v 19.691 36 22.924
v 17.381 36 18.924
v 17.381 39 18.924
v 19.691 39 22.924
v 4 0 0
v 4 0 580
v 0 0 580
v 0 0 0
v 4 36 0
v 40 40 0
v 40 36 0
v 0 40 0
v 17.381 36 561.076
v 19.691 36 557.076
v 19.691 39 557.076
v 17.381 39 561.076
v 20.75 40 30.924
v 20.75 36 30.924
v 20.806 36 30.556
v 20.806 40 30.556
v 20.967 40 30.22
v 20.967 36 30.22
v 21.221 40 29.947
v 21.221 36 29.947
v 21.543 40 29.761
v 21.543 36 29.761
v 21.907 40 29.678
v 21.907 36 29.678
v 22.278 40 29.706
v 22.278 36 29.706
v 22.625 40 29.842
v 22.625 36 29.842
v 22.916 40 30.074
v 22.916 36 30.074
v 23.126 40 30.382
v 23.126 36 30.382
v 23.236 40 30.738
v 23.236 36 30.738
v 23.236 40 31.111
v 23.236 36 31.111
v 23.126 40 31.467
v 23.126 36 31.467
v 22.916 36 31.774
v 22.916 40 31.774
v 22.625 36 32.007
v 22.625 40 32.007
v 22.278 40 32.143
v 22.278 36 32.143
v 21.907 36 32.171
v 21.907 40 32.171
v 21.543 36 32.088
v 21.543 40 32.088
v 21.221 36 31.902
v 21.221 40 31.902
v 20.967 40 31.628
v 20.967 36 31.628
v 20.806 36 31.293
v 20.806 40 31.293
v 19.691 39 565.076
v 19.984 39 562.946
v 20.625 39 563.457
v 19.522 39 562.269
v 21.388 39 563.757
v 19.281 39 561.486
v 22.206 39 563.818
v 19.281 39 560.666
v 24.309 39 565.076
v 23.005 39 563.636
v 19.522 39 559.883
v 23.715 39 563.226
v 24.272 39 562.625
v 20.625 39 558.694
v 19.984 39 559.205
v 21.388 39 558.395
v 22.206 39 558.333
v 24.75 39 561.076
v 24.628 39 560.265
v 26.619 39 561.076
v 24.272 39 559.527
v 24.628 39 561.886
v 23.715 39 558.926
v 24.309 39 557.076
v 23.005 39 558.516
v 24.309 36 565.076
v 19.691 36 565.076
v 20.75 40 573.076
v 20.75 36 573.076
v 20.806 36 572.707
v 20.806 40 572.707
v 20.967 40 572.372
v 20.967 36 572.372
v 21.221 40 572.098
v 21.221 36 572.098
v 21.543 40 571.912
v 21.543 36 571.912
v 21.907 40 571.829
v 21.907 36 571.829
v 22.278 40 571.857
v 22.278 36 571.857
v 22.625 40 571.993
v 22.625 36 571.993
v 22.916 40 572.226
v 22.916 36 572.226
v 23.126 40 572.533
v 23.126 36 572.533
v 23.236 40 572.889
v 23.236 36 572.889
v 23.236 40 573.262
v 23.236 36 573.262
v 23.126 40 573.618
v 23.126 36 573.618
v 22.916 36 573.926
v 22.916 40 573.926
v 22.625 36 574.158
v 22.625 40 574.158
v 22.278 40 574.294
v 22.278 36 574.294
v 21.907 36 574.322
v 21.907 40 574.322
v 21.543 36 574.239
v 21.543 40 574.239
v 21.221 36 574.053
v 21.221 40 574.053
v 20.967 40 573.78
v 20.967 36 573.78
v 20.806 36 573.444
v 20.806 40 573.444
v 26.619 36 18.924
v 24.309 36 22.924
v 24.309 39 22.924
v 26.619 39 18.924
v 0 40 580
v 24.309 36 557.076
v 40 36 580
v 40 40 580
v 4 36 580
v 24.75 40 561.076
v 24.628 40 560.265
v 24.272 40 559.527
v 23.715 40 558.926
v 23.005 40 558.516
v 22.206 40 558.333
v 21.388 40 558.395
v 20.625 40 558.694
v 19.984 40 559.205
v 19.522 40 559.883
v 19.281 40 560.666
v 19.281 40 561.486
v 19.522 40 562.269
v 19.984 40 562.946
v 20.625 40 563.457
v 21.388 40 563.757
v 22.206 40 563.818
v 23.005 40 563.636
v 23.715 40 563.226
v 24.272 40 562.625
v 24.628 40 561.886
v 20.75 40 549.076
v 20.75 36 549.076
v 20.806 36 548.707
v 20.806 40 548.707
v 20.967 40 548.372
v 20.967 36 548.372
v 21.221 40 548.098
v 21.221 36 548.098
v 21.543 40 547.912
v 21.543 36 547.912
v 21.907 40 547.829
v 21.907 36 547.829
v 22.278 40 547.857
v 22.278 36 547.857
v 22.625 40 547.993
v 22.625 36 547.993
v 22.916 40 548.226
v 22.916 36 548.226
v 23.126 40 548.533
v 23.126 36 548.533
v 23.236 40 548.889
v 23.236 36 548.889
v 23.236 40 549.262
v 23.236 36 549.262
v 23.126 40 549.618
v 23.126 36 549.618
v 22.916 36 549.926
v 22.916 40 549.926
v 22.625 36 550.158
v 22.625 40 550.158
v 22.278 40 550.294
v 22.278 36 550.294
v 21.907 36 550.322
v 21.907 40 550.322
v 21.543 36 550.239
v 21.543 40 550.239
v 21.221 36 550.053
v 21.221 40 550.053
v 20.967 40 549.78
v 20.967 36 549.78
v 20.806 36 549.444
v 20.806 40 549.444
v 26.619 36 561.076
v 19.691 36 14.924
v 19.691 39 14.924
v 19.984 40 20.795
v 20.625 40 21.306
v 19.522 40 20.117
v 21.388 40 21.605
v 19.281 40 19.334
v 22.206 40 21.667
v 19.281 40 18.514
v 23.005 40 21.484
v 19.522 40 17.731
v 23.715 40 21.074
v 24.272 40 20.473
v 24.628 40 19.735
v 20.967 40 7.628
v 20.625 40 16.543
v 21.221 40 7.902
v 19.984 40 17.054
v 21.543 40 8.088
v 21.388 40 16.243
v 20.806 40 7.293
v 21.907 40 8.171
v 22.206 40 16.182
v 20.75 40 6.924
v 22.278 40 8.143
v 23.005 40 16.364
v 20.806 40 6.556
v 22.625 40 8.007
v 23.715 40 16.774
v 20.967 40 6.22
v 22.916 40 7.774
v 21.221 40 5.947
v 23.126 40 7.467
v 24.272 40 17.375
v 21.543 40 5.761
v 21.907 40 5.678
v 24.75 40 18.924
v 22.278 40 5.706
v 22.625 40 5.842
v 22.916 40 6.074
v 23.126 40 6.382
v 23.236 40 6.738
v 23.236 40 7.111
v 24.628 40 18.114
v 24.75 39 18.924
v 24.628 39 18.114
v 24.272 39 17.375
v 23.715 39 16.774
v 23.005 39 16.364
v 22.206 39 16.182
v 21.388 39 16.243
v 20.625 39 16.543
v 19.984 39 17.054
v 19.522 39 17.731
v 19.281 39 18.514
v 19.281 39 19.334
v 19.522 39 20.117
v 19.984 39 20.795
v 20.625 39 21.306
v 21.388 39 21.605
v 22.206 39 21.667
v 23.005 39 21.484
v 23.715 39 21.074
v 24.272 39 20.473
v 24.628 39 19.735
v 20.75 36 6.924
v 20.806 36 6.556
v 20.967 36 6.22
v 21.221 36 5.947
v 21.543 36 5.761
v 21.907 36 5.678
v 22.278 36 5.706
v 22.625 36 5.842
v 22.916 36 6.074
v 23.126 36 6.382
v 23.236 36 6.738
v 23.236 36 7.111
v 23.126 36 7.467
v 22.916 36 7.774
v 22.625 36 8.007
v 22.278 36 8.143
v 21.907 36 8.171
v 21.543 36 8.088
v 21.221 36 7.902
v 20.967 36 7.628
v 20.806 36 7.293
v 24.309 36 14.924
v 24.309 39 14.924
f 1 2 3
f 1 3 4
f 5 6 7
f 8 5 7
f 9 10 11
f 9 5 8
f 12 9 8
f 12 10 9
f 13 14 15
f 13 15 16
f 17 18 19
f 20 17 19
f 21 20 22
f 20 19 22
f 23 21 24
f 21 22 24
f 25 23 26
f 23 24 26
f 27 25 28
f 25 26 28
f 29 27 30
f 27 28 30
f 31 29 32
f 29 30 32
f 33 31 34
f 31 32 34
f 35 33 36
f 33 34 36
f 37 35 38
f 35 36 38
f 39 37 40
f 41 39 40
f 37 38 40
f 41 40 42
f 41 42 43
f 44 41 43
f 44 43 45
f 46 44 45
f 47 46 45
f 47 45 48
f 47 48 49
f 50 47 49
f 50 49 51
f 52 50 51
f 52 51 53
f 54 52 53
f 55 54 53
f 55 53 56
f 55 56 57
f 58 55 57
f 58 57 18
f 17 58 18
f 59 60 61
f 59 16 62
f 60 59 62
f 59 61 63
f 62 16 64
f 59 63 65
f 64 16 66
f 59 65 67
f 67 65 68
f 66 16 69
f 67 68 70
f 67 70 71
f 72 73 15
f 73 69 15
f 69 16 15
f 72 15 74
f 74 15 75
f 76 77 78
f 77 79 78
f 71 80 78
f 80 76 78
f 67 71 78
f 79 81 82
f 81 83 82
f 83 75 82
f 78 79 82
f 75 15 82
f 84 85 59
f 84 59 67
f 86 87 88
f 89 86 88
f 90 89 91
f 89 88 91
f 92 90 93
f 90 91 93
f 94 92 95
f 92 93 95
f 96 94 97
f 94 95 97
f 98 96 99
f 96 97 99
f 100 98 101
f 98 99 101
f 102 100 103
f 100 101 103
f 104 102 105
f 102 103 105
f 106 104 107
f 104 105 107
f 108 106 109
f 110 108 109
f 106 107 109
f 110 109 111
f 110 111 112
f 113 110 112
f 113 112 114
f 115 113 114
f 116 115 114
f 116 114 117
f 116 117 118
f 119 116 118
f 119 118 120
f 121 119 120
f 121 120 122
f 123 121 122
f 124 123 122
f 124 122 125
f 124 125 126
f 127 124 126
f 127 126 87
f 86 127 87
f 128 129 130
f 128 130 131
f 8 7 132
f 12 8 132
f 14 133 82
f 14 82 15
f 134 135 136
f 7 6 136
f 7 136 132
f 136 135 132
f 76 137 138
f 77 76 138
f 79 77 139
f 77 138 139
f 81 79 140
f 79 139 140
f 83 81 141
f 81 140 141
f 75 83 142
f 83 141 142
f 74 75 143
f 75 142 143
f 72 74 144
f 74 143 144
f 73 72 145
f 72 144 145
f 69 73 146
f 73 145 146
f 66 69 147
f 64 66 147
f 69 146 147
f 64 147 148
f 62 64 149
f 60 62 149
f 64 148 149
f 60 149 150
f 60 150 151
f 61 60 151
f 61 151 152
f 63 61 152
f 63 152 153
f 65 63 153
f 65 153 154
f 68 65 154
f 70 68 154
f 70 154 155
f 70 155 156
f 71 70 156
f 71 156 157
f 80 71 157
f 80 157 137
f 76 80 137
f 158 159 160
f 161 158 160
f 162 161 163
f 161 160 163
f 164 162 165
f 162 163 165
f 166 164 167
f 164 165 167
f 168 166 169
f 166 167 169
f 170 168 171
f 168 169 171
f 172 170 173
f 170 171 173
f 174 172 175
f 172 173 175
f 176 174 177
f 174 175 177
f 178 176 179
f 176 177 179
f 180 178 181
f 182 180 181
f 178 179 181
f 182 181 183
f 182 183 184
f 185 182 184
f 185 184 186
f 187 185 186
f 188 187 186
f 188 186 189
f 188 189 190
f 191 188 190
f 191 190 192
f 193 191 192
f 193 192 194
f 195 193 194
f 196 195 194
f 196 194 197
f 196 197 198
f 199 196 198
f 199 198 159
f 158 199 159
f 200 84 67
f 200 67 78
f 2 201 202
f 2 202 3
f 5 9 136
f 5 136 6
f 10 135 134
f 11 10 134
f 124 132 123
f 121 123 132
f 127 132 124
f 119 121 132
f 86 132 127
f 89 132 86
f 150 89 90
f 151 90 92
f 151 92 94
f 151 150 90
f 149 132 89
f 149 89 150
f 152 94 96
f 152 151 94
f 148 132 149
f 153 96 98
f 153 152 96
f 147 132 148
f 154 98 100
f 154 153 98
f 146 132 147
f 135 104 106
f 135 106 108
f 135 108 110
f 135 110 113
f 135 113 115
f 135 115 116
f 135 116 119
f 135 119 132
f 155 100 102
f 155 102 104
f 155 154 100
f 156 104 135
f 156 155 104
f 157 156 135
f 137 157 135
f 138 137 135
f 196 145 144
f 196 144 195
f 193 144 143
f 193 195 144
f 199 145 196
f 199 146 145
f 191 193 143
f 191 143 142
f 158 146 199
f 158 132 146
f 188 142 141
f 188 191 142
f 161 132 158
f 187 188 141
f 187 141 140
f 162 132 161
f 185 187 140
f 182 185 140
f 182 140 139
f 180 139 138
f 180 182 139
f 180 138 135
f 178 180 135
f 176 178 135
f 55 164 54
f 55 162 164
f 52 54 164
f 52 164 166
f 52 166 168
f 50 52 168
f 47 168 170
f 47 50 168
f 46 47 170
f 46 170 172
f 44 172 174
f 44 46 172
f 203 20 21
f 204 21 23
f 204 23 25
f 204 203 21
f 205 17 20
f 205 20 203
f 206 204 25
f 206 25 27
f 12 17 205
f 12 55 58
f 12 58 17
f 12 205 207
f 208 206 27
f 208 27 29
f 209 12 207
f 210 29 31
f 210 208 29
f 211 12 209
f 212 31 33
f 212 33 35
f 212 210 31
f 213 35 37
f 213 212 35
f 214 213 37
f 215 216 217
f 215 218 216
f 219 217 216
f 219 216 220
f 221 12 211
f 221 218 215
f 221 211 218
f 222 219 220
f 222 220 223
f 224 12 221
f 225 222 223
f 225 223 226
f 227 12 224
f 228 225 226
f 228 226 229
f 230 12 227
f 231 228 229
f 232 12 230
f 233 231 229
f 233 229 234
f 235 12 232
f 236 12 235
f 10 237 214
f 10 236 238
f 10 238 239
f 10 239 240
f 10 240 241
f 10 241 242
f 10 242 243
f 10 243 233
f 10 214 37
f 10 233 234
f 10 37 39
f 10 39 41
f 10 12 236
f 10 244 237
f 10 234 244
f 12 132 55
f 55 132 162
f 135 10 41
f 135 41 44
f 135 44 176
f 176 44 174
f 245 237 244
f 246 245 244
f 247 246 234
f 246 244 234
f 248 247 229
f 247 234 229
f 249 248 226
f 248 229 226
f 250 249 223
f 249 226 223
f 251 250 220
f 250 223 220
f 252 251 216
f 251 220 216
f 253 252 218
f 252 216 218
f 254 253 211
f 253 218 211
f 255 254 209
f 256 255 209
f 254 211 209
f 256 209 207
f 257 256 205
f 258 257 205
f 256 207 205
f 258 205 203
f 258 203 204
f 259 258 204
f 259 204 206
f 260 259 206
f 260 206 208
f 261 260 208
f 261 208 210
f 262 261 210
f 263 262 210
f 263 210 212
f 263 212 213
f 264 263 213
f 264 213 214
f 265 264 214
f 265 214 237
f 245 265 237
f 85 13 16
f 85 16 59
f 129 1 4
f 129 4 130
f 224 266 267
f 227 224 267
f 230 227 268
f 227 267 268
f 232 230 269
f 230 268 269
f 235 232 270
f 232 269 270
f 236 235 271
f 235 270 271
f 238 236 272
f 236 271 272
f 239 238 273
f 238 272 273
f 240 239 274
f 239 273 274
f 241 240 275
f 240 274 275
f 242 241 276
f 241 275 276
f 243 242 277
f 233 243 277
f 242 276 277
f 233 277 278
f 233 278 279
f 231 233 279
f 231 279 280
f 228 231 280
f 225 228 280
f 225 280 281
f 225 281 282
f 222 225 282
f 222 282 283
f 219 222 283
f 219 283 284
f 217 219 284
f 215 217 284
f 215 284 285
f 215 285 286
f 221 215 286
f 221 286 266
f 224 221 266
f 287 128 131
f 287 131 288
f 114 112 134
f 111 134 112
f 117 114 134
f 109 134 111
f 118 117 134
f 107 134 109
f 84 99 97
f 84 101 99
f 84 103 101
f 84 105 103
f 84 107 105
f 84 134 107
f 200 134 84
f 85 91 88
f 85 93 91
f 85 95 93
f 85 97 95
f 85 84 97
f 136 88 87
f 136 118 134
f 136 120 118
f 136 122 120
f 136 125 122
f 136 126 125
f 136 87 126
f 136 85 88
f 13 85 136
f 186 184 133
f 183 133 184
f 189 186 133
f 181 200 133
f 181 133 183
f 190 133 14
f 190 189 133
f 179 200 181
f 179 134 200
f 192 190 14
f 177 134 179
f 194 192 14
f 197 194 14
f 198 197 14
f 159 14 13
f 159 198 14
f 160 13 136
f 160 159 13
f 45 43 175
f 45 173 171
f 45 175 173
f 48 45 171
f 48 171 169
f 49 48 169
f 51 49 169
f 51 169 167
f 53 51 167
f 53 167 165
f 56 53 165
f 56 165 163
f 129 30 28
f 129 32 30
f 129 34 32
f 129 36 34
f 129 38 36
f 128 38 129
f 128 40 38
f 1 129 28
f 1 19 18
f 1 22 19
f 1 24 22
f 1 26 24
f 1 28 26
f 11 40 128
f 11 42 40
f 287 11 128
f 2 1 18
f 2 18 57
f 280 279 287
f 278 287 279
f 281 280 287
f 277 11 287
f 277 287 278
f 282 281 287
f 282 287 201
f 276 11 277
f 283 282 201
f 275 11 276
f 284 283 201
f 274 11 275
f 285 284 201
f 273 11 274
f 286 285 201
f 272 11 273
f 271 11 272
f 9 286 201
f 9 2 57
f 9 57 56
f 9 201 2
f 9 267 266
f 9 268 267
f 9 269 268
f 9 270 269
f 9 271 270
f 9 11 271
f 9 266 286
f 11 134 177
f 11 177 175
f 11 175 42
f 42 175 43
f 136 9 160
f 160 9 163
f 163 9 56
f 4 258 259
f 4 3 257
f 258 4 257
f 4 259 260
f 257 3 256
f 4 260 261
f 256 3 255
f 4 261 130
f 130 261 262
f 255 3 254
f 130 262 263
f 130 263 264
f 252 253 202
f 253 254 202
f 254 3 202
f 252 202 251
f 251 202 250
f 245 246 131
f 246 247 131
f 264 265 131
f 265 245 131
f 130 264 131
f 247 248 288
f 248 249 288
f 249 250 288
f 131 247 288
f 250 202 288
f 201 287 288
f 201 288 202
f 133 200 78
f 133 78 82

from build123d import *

# Parameters (mm, degrees)
BOSS_EXTRUDE1_DEPTH     = 580
CUT_EXTRUDE1_DEPTH      = 3
TAP_DRILL_FOR_M3_TAP1_D = 2.5
M5_CLEARANCE_HOLE1_D    = 5.5


with BuildPart() as part:
    # Sketch1 → Boss-Extrude1 (new body)
    with BuildSketch(Plane.XY):
        Polygon((0, 0), (0, 40), (40, 40), (40, 36), (4, 36), (4, 0), align=None)
    extrude(amount=BOSS_EXTRUDE1_DEPTH)

    # Sketch2 → Cut-Extrude1 (cut)
    with BuildSketch(Plane(origin=(0, 36, 0), x_dir=(1, 0, 0), z_dir=(0, 1, 0))):
        Polygon((24.309401077, -14.924264069), (19.690598923, -14.924264069), (17.381197846, -18.924264069), (19.690598923, -22.924264069), (24.309401077, -22.924264069), (26.618802154, -18.924264069), align=None)
        Polygon((24.309401077, -557.075735931), (19.690598923, -557.075735931), (17.381197846, -561.075735931), (19.690598923, -565.075735931), (24.309401077, -565.075735931), (26.618802154, -561.075735931), align=None)
    extrude(amount=CUT_EXTRUDE1_DEPTH, mode=Mode.SUBTRACT)

    # Tap Drill for M3 Tap1 (through all)
    with Locations(Plane(origin=(0, 40, 0), x_dir=(1, 0, 0), z_dir=(0, 1, 0))):
        with Locations((22, -549.075735931), (22, -573.075735931), (22, -30.924264069), (22, -6.924264069)):
            Hole(TAP_DRILL_FOR_M3_TAP1_D / 2)

    # M5 Clearance Hole1 (through all)
    with Locations(Plane(origin=(0, 39, 0), x_dir=(-1, 0, 0), z_dir=(0, -1, 0))):
        with Locations((-22, -561.075735931), (-22, -18.924264069)):
            Hole(M5_CLEARANCE_HOLE1_D / 2)


solid = part.part
